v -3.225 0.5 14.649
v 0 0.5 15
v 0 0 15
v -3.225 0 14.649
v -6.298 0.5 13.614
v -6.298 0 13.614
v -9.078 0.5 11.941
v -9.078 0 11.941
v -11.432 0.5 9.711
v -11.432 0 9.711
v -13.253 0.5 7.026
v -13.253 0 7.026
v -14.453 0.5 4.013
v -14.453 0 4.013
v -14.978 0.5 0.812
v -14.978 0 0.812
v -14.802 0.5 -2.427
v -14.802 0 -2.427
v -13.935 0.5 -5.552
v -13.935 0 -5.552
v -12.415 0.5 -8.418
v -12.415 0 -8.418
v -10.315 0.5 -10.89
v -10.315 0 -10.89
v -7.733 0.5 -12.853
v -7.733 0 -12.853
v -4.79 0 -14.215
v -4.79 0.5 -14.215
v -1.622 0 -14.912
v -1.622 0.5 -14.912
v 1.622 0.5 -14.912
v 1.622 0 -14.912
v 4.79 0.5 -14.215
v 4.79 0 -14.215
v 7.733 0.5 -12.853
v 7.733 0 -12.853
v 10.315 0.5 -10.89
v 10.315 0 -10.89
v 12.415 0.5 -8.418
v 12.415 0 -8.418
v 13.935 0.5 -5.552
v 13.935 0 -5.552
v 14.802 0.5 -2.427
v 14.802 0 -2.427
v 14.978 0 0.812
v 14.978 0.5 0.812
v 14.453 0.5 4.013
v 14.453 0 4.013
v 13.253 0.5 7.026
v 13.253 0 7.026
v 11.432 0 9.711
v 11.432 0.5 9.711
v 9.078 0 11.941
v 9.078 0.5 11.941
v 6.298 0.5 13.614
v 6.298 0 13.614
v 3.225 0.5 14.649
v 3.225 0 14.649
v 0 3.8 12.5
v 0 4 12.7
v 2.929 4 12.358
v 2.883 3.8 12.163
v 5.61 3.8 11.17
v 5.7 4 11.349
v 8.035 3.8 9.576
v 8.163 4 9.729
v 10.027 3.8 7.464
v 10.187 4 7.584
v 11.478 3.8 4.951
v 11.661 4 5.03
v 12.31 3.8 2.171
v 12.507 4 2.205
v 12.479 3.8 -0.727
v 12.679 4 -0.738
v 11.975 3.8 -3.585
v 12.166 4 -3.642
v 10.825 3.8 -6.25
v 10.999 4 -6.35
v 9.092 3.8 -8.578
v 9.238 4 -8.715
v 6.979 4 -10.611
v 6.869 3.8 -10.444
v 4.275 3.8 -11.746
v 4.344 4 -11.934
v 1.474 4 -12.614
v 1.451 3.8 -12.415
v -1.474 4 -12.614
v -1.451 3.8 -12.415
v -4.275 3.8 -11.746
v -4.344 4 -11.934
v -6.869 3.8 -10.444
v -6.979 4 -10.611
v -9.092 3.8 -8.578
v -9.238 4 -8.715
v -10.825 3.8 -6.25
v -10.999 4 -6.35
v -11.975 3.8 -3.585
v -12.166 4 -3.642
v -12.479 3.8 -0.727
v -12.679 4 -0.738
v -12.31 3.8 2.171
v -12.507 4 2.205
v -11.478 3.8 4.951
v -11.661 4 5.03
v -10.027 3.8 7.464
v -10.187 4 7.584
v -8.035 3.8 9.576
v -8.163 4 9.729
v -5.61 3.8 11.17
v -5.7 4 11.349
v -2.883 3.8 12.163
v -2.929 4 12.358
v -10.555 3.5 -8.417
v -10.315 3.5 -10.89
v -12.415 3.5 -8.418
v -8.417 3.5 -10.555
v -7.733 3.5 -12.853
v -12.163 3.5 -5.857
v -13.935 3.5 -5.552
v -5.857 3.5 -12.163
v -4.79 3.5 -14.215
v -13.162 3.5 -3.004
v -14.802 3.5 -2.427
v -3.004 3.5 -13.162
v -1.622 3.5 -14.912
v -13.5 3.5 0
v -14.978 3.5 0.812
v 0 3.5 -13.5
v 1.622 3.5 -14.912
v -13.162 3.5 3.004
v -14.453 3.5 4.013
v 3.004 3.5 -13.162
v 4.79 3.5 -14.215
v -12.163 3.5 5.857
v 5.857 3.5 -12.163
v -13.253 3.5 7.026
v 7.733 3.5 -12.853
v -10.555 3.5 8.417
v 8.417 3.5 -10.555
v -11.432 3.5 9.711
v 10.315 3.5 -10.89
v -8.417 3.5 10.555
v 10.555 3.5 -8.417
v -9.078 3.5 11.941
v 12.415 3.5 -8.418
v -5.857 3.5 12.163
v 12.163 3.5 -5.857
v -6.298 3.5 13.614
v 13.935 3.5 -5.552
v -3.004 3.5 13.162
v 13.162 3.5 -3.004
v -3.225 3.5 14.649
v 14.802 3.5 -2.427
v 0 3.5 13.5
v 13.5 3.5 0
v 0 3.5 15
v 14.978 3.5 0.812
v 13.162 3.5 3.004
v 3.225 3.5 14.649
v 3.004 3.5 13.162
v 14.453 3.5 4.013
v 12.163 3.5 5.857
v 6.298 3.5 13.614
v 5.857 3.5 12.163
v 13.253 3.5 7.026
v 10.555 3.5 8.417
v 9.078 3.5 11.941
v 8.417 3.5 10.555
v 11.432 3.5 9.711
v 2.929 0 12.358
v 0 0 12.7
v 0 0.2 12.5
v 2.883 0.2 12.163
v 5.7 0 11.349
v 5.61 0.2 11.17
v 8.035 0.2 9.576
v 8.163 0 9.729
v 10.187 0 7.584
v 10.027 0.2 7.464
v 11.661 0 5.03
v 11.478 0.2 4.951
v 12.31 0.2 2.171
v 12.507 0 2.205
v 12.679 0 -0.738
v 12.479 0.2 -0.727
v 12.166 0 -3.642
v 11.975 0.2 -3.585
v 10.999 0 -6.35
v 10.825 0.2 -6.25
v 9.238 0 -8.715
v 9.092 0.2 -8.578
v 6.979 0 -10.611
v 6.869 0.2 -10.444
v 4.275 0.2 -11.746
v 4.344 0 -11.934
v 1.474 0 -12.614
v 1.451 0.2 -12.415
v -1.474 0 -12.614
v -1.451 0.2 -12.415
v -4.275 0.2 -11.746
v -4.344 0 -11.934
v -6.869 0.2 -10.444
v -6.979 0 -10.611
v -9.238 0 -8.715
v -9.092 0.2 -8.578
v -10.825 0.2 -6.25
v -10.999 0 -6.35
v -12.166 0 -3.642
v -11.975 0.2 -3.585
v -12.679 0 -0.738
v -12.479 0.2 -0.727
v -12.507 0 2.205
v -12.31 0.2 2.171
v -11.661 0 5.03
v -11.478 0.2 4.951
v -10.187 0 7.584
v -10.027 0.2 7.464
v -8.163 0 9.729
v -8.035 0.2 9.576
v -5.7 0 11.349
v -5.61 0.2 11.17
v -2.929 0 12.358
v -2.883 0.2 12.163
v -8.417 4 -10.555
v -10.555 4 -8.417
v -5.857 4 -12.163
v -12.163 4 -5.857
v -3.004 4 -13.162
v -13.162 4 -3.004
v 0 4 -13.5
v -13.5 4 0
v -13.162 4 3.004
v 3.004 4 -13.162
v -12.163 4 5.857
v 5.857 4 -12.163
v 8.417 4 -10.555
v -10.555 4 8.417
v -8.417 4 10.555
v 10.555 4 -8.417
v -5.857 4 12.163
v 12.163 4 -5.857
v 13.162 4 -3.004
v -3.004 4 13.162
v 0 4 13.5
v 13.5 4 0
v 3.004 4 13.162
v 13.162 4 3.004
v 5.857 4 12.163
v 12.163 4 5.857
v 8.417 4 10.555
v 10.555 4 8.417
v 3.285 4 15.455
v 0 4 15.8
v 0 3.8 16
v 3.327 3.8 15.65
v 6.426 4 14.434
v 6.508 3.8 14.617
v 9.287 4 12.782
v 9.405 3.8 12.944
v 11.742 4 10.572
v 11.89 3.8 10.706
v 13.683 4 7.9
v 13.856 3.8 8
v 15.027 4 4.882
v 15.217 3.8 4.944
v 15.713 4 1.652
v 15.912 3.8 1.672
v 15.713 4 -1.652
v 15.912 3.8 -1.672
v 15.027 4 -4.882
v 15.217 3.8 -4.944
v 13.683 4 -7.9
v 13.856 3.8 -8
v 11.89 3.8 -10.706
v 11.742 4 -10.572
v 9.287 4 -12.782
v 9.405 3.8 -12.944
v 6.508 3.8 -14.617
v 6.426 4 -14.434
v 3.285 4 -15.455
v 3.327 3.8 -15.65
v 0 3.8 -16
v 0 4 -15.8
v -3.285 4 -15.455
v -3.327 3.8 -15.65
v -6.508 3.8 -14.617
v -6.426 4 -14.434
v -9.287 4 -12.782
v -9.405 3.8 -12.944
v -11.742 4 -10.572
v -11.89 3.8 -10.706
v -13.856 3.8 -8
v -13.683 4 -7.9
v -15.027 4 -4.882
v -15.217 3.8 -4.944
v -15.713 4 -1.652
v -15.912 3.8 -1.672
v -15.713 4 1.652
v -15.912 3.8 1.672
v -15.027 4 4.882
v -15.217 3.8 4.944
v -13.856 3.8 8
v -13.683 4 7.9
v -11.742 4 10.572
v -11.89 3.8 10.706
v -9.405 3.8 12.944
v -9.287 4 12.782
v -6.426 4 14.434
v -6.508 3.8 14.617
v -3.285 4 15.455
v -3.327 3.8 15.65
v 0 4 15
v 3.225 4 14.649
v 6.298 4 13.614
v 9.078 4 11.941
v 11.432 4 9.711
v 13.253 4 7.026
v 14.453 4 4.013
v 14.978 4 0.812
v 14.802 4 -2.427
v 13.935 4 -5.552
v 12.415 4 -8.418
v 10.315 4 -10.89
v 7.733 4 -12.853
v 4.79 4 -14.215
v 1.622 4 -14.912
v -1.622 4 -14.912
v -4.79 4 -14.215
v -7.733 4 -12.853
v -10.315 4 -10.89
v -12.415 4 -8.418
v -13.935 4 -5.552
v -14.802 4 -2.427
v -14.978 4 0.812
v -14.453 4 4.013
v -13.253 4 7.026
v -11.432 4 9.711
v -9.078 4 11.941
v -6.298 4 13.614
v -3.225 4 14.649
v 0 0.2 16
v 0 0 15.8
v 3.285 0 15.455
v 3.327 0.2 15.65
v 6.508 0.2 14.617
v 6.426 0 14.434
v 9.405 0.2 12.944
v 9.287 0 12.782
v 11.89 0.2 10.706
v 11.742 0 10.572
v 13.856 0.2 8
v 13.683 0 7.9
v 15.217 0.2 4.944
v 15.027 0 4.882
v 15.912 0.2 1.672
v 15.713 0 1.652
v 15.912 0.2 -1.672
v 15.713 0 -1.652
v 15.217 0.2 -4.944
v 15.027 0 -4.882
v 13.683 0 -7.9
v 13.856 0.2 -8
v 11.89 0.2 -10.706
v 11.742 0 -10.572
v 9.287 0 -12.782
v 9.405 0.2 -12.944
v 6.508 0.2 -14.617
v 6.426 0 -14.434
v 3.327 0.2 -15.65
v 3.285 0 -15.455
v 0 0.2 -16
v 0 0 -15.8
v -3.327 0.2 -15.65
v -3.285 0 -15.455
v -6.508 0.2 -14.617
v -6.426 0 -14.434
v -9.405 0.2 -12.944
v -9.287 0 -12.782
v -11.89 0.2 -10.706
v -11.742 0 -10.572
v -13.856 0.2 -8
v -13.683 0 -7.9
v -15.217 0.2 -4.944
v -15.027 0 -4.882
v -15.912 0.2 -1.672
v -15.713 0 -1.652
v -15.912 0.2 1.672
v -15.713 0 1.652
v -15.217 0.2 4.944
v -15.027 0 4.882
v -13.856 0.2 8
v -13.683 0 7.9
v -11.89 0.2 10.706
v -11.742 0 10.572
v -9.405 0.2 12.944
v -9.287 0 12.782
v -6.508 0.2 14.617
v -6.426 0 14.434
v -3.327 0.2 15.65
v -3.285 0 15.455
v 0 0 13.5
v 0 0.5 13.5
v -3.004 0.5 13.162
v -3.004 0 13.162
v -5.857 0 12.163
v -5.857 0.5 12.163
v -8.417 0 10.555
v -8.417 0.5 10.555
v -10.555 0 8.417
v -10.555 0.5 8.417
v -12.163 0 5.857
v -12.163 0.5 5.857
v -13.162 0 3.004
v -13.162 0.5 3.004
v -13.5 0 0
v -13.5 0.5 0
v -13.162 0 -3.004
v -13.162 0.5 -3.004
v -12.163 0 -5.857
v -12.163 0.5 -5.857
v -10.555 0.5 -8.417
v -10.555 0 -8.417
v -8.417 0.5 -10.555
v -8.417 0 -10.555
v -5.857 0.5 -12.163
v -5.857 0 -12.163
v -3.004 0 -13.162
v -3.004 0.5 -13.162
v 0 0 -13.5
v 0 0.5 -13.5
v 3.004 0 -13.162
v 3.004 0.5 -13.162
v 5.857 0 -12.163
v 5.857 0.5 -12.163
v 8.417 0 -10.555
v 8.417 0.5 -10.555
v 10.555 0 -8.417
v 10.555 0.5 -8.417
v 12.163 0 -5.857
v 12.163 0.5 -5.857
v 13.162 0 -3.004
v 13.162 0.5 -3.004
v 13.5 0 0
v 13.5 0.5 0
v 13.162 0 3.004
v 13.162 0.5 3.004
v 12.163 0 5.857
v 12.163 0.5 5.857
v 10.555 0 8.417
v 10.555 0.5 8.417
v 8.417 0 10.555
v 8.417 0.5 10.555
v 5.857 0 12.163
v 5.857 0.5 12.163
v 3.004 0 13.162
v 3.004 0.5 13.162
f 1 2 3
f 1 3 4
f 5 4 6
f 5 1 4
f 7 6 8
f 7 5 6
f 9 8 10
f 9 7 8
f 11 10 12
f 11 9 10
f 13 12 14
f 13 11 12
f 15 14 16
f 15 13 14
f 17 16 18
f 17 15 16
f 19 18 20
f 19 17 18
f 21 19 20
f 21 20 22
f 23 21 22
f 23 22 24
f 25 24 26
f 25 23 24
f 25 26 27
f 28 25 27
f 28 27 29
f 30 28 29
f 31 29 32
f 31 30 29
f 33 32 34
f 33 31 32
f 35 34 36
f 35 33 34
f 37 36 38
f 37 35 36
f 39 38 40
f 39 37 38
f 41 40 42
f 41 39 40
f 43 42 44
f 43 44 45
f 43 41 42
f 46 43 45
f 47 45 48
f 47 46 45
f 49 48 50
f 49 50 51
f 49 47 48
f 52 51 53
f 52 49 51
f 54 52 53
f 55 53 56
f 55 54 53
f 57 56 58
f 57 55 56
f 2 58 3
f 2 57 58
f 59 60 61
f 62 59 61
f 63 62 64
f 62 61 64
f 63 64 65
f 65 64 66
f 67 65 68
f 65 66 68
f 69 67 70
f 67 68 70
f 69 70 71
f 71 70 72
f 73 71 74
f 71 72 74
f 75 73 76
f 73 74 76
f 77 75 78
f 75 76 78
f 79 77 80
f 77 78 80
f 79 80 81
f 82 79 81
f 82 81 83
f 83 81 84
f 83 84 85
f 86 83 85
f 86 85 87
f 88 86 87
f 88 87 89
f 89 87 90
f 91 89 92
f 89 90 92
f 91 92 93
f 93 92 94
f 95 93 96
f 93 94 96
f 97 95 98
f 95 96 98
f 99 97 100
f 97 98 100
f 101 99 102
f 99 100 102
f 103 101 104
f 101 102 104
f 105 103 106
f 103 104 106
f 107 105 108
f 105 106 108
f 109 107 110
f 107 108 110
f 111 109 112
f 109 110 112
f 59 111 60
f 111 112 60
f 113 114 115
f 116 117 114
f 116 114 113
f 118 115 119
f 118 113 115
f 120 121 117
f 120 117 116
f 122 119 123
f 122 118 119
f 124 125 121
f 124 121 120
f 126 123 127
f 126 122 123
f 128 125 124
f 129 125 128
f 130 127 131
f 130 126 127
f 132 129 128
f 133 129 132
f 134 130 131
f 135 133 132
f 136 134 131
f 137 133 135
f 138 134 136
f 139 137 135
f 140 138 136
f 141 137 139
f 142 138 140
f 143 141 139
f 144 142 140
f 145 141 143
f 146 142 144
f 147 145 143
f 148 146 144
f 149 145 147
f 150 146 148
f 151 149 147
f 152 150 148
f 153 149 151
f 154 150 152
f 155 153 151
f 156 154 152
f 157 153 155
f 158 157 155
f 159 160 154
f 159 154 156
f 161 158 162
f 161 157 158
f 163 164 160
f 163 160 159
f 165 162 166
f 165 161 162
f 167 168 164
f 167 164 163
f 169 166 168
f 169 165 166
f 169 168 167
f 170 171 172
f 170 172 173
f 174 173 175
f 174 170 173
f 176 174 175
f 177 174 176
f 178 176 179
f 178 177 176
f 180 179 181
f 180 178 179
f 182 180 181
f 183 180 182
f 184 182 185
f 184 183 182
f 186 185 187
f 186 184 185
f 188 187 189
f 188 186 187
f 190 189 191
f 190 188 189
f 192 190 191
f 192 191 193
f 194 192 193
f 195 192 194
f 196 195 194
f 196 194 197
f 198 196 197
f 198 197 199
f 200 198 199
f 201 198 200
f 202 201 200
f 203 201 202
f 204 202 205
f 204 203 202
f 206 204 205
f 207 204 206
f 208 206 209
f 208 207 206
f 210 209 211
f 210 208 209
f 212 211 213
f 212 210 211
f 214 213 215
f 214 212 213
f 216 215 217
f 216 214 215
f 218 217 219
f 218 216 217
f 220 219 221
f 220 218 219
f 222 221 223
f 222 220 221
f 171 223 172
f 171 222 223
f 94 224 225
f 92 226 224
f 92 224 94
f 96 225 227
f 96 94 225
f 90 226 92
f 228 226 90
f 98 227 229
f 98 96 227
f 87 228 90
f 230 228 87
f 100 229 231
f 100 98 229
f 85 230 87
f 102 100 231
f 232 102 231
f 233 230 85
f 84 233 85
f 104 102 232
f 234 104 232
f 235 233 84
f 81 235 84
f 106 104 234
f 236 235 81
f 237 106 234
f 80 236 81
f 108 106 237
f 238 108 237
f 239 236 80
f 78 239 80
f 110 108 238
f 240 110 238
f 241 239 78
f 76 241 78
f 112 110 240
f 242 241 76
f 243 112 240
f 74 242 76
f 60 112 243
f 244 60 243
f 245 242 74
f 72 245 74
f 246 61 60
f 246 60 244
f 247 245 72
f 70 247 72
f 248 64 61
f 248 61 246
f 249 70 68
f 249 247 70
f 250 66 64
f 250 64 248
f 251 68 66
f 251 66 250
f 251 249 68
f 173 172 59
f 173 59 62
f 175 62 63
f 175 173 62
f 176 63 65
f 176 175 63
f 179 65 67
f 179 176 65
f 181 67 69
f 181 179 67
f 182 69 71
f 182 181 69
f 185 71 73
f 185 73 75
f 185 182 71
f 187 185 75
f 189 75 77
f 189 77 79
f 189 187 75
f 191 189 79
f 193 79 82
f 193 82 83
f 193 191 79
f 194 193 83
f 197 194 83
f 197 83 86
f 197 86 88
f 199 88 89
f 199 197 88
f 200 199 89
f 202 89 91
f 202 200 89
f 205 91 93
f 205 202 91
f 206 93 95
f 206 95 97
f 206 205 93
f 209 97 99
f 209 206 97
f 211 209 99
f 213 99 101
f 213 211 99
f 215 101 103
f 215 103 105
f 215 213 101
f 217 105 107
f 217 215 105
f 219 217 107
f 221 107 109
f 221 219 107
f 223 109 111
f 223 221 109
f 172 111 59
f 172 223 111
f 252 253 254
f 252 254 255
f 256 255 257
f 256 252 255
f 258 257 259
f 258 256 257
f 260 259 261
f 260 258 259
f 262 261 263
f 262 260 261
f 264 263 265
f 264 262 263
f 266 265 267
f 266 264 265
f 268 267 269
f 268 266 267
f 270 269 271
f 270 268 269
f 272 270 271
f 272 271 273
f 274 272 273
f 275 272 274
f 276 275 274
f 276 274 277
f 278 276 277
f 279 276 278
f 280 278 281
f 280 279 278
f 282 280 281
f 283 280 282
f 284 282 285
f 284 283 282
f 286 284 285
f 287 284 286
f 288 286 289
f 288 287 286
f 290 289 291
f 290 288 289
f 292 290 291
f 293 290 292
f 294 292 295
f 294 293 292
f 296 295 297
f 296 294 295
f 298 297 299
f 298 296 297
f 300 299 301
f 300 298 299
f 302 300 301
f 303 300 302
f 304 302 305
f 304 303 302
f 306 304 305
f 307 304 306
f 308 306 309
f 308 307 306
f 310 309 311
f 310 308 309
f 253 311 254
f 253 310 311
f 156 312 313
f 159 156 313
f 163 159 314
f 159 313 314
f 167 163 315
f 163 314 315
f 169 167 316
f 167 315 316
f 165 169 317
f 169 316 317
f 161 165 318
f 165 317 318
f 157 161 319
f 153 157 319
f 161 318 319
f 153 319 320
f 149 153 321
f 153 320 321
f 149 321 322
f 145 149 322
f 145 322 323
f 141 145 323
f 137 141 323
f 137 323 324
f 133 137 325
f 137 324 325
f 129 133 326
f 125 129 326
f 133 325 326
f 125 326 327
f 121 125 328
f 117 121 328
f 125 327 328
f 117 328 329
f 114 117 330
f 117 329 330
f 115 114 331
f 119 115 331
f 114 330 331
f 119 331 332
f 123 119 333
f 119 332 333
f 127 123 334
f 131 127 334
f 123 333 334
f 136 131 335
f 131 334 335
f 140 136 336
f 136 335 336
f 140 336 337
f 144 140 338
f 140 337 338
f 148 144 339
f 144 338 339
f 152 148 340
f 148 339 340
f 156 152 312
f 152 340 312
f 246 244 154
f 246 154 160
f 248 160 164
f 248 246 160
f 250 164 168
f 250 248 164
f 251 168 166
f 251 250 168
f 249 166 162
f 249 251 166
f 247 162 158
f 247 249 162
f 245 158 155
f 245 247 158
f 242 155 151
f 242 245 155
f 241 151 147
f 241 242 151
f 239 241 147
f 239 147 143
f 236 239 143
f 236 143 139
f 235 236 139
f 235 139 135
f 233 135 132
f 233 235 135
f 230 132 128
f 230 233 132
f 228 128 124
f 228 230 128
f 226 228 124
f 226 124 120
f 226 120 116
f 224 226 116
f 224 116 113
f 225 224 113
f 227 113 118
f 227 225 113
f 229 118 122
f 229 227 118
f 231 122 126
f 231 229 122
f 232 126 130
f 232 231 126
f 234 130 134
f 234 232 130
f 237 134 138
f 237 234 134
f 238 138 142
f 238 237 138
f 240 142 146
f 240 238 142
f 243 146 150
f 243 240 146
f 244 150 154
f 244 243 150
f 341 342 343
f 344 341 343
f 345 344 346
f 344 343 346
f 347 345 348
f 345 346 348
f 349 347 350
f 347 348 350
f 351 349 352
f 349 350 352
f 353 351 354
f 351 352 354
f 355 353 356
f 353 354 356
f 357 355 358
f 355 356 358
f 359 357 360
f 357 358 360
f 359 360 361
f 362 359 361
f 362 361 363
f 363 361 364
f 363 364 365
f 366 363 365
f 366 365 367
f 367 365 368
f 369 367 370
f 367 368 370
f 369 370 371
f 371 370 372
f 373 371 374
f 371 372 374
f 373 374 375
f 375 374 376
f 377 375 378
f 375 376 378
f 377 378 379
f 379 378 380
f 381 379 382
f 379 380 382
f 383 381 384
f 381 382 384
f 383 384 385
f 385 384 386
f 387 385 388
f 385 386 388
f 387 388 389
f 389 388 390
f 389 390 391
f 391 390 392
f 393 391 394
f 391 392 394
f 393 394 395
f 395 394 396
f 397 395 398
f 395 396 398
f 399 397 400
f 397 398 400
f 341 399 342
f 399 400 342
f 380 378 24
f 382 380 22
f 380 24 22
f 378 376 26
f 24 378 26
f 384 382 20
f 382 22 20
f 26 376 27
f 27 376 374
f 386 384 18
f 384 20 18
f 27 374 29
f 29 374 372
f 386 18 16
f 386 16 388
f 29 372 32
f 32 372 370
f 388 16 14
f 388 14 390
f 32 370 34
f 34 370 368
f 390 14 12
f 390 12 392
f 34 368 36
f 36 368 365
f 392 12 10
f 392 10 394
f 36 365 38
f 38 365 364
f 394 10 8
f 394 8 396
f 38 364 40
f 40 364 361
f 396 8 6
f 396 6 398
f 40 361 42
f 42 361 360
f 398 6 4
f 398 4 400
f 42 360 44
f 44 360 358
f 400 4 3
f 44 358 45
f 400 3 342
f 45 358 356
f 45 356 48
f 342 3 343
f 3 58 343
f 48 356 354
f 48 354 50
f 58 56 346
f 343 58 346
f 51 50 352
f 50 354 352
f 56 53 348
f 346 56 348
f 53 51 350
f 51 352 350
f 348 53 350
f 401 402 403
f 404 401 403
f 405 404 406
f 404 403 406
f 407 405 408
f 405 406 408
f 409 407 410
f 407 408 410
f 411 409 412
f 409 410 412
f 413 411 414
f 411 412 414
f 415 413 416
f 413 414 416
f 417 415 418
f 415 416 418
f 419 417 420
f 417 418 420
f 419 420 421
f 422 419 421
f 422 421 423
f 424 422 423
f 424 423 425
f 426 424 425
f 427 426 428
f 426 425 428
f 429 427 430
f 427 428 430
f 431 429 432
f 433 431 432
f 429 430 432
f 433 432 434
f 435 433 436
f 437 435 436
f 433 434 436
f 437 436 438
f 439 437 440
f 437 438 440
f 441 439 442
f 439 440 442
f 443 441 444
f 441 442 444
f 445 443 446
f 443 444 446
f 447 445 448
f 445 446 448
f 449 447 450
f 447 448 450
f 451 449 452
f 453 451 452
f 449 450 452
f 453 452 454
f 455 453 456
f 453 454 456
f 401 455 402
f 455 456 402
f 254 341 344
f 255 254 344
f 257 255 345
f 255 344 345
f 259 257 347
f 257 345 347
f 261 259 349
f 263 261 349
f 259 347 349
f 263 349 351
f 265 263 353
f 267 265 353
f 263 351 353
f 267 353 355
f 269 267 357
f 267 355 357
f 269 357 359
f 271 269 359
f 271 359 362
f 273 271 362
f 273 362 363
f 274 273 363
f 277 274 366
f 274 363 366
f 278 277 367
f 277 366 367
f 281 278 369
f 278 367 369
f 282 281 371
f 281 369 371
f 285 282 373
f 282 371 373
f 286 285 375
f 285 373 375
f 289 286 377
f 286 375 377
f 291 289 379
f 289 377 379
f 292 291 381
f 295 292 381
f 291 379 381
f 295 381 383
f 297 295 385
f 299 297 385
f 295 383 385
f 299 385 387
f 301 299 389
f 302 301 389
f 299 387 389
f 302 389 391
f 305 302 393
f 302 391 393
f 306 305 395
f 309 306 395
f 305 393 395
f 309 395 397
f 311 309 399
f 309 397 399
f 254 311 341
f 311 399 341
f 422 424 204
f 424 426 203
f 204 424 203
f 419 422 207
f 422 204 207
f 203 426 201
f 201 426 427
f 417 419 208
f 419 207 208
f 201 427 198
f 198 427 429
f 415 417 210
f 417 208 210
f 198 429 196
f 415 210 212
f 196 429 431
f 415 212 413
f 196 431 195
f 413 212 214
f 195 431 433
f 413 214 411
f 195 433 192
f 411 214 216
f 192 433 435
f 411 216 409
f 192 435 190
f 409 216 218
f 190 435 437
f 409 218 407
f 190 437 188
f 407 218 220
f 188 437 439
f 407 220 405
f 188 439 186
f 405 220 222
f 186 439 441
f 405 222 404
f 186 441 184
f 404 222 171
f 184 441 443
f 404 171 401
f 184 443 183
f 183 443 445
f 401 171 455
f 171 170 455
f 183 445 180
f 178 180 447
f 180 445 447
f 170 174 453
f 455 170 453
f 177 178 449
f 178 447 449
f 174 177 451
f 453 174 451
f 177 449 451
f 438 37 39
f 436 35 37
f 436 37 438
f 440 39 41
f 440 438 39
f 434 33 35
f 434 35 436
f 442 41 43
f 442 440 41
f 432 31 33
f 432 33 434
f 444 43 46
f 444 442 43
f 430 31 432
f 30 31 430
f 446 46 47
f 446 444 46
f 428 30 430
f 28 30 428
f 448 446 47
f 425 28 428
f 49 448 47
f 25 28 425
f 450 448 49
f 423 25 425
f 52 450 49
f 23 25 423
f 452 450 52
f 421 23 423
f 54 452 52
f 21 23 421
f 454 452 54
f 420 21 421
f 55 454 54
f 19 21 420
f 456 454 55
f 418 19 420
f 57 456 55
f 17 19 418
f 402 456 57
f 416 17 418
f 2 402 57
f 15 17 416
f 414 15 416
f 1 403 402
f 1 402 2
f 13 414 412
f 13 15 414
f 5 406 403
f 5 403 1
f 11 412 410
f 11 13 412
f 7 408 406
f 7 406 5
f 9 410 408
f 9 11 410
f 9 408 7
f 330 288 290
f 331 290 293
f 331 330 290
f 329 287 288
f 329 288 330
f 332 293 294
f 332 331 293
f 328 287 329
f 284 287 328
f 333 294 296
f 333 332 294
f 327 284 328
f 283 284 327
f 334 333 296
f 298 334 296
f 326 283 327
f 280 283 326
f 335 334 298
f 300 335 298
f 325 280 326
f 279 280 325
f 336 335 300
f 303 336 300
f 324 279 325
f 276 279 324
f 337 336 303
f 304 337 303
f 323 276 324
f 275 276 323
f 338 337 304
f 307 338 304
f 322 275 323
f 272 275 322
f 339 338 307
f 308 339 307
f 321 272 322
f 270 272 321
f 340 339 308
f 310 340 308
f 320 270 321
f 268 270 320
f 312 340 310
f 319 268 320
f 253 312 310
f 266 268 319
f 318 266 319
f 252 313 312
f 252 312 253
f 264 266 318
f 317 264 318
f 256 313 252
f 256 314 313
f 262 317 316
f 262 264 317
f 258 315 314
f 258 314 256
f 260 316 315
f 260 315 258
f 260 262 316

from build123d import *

# Parameters (mm, degrees)
SKETCH_1_R          = 16
SKETCH_1_R_2        = 12.5
EXTRUDE_1_DEPTH     = 4
CHAMFER_1_SIZE      = 0.2
SKETCH_2_R          = 15
SKETCH_2_R_2        = 13.5
CUT_EXTRUDE_1_DEPTH = 0.5
CUT_EXTRUDE_START   = -0.5
SKETCH_3_R          = 15
SKETCH_3_R_2        = 13.5
CUT_EXTRUDE_2_DEPTH = 0.5


with BuildPart() as part:
    # 草图1 → 凸台-拉伸1 (new body)
    with BuildSketch(Plane(origin=(0, 0, 0), x_dir=(1, 0, 0), z_dir=(0, 1, 0))):
        with Locations(Location((0, 0, 0), (0, 0, 270))):
            Circle(SKETCH_1_R)
        with Locations(Location((0, 0, 0), (0, 0, 270))):
            Circle(SKETCH_1_R_2, mode=Mode.SUBTRACT)
    extrude(amount=EXTRUDE_1_DEPTH)

    # 倒角1
    chamfer_1_edges = [part.edges().sort_by_distance(p)[0] for p in [
        (0, 0, -16),
        (0, 4, -16),
        (0, 0, -12.5),
        (0, 4, -12.5),
    ]]
    chamfer(chamfer_1_edges, length=CHAMFER_1_SIZE)

    # 草图2 → 切除-拉伸1 (cut)
    with BuildSketch(Plane(origin=(0, 4, 0), x_dir=(1, 0, 0), z_dir=(0, 1, 0))):
        with Locations(Location((0, 0, 0), (0, 0, 270))):
            Circle(SKETCH_2_R)
        with Locations(Location((0, 0, 0), (0, 0, 270))):
            Circle(SKETCH_2_R_2, mode=Mode.SUBTRACT)
    extrude(amount=-CUT_EXTRUDE_1_DEPTH, mode=Mode.SUBTRACT)

    # 草图3 → 切除-拉伸2 (cut)
    with BuildSketch(Plane.XZ.offset(CUT_EXTRUDE_START)):
        with Locations(Location((0, 0, 0), (0, 0, 90))):
            Circle(SKETCH_3_R)
        with Locations(Location((0, 0, 0), (0, 0, 90))):
            Circle(SKETCH_3_R_2, mode=Mode.SUBTRACT)
    extrude(amount=CUT_EXTRUDE_2_DEPTH, mode=Mode.SUBTRACT)


solid = part.part
